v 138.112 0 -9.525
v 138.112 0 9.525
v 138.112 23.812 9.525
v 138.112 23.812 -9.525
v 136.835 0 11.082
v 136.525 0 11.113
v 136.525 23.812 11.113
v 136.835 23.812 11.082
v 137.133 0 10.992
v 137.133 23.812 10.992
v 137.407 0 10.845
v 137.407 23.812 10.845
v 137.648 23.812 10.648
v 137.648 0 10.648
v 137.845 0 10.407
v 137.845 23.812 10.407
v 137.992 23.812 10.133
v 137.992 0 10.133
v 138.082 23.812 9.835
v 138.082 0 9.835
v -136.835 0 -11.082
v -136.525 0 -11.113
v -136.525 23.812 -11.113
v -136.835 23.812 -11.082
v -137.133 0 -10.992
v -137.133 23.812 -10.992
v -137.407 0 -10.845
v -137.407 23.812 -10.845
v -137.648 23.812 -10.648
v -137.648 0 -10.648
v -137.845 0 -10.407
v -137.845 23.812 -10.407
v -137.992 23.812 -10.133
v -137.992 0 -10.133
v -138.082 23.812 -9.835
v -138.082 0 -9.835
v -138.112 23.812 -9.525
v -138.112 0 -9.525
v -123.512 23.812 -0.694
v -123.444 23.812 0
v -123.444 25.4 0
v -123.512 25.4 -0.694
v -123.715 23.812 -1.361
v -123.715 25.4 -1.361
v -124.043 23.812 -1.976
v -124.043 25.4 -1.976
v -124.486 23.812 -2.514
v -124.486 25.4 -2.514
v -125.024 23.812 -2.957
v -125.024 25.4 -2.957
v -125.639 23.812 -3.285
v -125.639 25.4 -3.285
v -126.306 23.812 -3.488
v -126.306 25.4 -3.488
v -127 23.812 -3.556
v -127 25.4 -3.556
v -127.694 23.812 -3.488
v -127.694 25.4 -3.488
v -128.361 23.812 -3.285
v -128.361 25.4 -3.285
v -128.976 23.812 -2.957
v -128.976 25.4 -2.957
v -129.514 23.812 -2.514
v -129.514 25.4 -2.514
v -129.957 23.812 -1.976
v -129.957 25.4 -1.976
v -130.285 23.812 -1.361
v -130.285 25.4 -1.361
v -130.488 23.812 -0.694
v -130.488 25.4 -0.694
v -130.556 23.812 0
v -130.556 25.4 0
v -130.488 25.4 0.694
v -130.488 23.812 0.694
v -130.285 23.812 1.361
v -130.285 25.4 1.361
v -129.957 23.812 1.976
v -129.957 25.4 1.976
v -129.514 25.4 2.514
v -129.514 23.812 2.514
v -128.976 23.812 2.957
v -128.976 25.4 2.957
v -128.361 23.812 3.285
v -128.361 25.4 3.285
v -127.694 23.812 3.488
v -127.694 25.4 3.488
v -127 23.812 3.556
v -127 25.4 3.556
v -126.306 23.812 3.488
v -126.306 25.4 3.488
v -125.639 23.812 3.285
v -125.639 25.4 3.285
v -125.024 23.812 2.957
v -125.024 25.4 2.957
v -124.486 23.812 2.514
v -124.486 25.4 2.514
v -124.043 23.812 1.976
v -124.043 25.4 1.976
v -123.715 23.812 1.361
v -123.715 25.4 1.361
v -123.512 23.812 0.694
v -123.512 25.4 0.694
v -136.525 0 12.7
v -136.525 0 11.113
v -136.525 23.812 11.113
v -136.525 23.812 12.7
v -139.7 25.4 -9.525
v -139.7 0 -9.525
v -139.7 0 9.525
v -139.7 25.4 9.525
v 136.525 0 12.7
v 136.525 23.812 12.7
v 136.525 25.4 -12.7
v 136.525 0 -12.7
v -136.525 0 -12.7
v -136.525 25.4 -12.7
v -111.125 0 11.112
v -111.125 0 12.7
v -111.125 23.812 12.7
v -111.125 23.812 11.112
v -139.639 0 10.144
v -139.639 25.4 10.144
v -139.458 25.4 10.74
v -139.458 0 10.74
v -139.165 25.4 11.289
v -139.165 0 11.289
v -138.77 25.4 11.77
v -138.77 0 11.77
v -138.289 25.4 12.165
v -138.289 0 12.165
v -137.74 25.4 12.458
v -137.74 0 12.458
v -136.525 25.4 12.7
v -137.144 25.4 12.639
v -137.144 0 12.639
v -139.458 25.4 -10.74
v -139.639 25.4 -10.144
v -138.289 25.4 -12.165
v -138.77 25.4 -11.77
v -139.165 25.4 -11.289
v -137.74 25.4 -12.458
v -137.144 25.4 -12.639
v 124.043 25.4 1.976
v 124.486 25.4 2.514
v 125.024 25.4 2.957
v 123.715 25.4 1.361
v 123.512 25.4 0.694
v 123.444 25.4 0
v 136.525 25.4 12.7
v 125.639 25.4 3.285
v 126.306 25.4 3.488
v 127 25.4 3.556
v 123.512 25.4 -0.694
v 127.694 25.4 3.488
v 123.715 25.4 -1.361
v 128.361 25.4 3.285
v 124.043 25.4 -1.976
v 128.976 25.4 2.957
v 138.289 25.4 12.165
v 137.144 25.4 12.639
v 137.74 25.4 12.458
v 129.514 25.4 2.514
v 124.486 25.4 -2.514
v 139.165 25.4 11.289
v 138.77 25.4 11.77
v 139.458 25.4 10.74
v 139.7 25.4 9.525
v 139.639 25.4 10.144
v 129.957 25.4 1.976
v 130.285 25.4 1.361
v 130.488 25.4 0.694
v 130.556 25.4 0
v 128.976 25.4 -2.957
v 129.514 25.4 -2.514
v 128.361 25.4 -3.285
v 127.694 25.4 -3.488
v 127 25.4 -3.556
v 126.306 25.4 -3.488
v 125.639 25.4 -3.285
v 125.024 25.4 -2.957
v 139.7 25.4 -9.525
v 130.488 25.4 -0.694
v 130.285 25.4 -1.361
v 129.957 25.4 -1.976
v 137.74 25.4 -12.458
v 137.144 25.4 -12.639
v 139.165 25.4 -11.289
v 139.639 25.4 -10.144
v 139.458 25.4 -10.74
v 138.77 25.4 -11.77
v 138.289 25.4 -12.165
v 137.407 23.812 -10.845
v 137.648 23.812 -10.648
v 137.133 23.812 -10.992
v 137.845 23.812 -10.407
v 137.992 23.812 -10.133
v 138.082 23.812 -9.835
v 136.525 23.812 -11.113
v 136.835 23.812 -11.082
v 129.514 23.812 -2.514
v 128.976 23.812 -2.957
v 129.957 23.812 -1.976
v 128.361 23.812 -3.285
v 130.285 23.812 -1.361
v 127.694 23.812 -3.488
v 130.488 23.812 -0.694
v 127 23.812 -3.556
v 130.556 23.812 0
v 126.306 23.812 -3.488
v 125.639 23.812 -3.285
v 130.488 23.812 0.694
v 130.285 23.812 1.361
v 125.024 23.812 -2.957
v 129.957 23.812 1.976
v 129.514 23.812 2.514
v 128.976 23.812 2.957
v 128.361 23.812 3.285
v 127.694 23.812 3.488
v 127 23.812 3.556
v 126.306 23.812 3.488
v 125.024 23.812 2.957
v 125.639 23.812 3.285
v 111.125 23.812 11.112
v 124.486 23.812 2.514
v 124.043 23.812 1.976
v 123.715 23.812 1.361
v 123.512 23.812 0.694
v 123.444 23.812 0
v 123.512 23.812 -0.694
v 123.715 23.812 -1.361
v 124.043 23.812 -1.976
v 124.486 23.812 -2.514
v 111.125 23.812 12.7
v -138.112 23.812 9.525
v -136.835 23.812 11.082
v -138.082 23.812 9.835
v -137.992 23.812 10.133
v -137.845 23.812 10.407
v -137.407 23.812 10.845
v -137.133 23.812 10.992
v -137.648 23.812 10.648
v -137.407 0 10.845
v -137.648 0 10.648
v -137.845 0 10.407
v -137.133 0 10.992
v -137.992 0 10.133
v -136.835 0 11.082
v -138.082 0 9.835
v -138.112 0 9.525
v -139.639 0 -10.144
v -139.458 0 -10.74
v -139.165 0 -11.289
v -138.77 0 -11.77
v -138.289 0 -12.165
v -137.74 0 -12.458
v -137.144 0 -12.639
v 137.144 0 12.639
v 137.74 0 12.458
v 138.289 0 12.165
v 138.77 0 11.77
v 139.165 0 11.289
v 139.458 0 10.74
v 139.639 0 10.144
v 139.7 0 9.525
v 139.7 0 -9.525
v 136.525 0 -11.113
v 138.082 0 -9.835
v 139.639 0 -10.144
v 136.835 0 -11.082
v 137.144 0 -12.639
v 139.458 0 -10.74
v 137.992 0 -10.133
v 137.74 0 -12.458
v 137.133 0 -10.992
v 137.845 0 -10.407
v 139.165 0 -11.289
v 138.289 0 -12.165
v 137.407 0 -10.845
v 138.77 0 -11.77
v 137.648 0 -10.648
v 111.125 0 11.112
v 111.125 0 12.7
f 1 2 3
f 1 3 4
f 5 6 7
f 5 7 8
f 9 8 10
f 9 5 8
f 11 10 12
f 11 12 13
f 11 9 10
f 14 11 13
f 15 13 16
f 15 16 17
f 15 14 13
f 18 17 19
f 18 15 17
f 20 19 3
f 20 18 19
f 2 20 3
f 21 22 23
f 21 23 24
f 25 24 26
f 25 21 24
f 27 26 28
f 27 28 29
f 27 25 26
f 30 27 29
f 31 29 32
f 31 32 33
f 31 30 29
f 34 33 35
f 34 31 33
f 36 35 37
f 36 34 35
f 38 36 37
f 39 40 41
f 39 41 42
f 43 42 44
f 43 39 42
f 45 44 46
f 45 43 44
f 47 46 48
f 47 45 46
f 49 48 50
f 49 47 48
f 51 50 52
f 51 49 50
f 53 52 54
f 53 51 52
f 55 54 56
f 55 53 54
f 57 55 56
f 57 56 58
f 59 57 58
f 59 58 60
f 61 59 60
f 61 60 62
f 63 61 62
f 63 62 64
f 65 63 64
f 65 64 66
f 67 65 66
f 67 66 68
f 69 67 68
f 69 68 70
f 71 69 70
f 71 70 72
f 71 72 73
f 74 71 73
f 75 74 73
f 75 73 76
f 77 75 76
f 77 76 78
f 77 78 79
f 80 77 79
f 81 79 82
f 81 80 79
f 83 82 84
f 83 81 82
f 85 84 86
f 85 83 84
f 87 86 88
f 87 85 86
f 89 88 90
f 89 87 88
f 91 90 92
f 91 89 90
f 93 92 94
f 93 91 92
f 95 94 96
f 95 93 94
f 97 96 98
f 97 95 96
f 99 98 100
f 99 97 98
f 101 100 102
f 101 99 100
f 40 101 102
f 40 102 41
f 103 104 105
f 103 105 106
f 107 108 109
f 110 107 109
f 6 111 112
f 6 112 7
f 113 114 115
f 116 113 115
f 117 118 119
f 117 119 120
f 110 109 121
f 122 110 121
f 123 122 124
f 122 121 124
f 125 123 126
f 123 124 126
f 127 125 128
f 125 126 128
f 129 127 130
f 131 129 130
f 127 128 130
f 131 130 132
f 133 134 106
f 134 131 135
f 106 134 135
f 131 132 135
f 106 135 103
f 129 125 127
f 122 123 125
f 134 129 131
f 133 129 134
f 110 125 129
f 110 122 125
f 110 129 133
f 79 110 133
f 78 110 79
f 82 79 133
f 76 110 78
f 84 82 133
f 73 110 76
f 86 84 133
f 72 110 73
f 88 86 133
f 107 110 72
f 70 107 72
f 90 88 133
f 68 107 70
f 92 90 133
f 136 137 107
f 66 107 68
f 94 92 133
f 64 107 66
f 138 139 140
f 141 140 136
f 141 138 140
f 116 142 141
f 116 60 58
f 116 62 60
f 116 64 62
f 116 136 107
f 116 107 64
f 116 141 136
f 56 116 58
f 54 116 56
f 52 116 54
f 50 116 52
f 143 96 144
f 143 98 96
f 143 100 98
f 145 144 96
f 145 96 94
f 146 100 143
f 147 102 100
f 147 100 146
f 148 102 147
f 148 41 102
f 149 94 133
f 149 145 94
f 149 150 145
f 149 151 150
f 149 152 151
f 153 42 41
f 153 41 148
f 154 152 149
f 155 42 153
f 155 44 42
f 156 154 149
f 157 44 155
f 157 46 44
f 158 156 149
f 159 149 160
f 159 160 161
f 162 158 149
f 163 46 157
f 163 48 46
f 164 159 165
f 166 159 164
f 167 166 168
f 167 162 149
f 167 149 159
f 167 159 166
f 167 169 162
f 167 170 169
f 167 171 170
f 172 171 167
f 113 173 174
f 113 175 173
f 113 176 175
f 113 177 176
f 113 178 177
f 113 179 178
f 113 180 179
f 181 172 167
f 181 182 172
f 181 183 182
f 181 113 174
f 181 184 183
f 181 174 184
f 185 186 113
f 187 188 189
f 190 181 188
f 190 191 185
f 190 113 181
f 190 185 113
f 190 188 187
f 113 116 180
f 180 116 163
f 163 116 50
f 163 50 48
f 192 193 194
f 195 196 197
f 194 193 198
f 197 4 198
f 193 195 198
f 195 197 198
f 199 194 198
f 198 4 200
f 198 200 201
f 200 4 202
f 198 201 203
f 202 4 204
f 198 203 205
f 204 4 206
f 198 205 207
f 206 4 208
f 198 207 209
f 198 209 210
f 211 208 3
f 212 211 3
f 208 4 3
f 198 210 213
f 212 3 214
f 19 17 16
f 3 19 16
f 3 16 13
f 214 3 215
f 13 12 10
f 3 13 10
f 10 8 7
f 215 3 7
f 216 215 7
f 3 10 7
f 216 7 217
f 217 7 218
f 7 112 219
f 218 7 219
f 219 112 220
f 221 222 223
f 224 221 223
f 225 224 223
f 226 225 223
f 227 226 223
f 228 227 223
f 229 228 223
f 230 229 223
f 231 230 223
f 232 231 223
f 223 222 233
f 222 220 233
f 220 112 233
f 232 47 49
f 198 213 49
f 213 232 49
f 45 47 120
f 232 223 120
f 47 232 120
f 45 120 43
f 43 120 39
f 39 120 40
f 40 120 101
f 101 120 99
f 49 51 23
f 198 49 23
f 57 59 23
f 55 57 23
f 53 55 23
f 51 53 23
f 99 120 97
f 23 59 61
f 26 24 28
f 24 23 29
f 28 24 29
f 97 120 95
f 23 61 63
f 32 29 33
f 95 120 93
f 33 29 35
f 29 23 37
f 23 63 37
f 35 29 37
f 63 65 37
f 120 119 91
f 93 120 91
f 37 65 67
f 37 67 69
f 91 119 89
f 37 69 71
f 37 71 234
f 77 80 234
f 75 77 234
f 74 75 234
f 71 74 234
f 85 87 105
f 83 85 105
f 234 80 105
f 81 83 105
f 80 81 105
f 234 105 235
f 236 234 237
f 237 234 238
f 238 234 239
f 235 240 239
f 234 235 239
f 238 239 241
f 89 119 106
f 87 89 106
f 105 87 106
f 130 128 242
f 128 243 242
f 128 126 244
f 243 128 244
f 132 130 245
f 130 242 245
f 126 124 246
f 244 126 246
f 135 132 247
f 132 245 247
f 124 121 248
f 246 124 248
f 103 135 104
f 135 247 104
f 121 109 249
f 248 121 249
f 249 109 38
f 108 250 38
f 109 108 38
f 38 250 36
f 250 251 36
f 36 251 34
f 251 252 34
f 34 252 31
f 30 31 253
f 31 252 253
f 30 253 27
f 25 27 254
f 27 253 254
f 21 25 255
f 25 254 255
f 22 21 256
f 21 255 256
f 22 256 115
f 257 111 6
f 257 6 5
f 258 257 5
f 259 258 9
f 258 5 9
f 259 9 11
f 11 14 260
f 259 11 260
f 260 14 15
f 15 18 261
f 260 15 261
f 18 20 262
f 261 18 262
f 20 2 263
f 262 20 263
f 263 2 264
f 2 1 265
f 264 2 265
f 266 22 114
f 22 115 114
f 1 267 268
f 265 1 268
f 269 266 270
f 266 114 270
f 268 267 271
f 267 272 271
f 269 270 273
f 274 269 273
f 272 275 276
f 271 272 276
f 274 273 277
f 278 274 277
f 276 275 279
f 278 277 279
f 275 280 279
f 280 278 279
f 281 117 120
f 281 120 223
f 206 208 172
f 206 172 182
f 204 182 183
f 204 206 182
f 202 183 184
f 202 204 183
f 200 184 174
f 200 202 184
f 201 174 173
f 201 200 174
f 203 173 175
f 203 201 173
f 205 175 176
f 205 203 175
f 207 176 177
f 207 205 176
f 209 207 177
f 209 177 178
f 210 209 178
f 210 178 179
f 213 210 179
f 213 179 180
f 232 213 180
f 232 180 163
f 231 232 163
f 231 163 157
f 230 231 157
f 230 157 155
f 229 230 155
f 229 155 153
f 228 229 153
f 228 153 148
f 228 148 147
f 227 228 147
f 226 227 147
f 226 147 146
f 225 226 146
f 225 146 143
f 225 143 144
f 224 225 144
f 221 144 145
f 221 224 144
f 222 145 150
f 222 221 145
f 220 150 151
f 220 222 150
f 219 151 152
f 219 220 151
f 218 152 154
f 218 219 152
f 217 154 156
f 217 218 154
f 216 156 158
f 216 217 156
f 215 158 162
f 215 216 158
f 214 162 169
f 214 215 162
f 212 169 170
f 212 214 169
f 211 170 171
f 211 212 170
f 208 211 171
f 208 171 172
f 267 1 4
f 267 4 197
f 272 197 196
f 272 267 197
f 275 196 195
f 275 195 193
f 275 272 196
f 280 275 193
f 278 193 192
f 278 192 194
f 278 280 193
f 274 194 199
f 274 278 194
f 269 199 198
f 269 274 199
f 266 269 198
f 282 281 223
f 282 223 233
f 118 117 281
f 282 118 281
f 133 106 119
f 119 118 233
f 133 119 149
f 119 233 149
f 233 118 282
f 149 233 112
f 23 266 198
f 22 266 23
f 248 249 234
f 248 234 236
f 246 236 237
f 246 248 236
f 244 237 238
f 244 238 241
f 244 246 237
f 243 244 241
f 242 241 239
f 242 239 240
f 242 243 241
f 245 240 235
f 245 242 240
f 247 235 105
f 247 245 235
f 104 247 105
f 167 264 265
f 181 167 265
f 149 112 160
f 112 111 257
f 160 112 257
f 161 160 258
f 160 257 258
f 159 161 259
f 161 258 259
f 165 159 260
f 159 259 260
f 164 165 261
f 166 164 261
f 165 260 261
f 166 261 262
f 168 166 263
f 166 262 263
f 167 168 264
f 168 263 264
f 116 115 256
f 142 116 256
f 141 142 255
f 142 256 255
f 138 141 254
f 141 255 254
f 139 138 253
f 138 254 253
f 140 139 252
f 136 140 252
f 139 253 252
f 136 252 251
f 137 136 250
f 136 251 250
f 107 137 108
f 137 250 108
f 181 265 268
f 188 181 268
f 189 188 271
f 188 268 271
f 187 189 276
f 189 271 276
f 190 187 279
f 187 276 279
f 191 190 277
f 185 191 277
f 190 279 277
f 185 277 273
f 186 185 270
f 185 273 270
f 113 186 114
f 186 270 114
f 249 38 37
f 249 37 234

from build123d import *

# Parameters (mm, degrees)
SKETCH1_R           = 3.556
BOSS_EXTRUDE3_DEPTH = 25.4
CUT_EXTRUDE3_DEPTH  = 23.8125


with BuildPart() as part:
    # Sketch1 → Boss-Extrude3 (new body)
    with BuildSketch(Plane(origin=(0, 0, 0), x_dir=(1, 0, 0), z_dir=(0, 1, 0))):
        with BuildLine():
            Line((-136.525, -12.7), (136.525, -12.7))
            ThreePointArc((136.525, -12.7), (138.77006403, -11.77006403), (139.7, -9.525))
            Line((139.7, -9.525), (139.7, 9.525))
            ThreePointArc((139.7, 9.525), (138.77006403, 11.77006403), (136.525, 12.7))
            Line((136.525, 12.7), (-136.525, 12.7))
            ThreePointArc((-136.525, 12.7), (-138.77006403, 11.77006403), (-139.7, 9.525))
            Line((-139.7, 9.525), (-139.7, -9.525))
            ThreePointArc((-139.7, -9.525), (-138.77006403, -11.77006403), (-136.525, -12.7))
        make_face()
        with Locations((127, 0)):
            Circle(SKETCH1_R, mode=Mode.SUBTRACT)
        with Locations((-127, 0)):
            Circle(SKETCH1_R, mode=Mode.SUBTRACT)
    extrude(amount=BOSS_EXTRUDE3_DEPTH)

    # Sketch5 → Cut-Extrude3 (cut)
    with BuildSketch(Plane.XZ):
        with BuildLine():
            Line((-136.525, 11.1125), (-136.525, 12.7))
            Line((-136.525, 12.7), (-111.125, 12.7))
            Line((-111.125, 12.7), (-111.125, 11.1125))
            Line((-111.125, 11.1125), (111.125, 11.1125))
            Line((111.125, 11.1125), (111.125, 12.7))
            Line((111.125, 12.7), (136.525, 12.7))
            Line((136.525, 12.7), (136.525, 11.1125))
            ThreePointArc((136.525, 11.1125), (137.647532015, 10.647532015), (138.1125, 9.525))
            Line((138.1125, 9.525), (138.1125, -9.525))
            ThreePointArc((138.1125, -9.525), (137.647532015, -10.647532015), (136.525, -11.1125))
            Line((136.525, -11.1125), (-136.525, -11.1125))
            ThreePointArc((-136.525, -11.1125), (-137.647532015, -10.647532015), (-138.1125, -9.525))
            Line((-138.1125, -9.525), (-138.1125, 9.525))
            ThreePointArc((-138.1125, 9.525), (-137.647532015, 10.647532015), (-136.525, 11.1125))
        make_face()
    extrude(amount=-CUT_EXTRUDE3_DEPTH, mode=Mode.SUBTRACT)


solid = part.part
